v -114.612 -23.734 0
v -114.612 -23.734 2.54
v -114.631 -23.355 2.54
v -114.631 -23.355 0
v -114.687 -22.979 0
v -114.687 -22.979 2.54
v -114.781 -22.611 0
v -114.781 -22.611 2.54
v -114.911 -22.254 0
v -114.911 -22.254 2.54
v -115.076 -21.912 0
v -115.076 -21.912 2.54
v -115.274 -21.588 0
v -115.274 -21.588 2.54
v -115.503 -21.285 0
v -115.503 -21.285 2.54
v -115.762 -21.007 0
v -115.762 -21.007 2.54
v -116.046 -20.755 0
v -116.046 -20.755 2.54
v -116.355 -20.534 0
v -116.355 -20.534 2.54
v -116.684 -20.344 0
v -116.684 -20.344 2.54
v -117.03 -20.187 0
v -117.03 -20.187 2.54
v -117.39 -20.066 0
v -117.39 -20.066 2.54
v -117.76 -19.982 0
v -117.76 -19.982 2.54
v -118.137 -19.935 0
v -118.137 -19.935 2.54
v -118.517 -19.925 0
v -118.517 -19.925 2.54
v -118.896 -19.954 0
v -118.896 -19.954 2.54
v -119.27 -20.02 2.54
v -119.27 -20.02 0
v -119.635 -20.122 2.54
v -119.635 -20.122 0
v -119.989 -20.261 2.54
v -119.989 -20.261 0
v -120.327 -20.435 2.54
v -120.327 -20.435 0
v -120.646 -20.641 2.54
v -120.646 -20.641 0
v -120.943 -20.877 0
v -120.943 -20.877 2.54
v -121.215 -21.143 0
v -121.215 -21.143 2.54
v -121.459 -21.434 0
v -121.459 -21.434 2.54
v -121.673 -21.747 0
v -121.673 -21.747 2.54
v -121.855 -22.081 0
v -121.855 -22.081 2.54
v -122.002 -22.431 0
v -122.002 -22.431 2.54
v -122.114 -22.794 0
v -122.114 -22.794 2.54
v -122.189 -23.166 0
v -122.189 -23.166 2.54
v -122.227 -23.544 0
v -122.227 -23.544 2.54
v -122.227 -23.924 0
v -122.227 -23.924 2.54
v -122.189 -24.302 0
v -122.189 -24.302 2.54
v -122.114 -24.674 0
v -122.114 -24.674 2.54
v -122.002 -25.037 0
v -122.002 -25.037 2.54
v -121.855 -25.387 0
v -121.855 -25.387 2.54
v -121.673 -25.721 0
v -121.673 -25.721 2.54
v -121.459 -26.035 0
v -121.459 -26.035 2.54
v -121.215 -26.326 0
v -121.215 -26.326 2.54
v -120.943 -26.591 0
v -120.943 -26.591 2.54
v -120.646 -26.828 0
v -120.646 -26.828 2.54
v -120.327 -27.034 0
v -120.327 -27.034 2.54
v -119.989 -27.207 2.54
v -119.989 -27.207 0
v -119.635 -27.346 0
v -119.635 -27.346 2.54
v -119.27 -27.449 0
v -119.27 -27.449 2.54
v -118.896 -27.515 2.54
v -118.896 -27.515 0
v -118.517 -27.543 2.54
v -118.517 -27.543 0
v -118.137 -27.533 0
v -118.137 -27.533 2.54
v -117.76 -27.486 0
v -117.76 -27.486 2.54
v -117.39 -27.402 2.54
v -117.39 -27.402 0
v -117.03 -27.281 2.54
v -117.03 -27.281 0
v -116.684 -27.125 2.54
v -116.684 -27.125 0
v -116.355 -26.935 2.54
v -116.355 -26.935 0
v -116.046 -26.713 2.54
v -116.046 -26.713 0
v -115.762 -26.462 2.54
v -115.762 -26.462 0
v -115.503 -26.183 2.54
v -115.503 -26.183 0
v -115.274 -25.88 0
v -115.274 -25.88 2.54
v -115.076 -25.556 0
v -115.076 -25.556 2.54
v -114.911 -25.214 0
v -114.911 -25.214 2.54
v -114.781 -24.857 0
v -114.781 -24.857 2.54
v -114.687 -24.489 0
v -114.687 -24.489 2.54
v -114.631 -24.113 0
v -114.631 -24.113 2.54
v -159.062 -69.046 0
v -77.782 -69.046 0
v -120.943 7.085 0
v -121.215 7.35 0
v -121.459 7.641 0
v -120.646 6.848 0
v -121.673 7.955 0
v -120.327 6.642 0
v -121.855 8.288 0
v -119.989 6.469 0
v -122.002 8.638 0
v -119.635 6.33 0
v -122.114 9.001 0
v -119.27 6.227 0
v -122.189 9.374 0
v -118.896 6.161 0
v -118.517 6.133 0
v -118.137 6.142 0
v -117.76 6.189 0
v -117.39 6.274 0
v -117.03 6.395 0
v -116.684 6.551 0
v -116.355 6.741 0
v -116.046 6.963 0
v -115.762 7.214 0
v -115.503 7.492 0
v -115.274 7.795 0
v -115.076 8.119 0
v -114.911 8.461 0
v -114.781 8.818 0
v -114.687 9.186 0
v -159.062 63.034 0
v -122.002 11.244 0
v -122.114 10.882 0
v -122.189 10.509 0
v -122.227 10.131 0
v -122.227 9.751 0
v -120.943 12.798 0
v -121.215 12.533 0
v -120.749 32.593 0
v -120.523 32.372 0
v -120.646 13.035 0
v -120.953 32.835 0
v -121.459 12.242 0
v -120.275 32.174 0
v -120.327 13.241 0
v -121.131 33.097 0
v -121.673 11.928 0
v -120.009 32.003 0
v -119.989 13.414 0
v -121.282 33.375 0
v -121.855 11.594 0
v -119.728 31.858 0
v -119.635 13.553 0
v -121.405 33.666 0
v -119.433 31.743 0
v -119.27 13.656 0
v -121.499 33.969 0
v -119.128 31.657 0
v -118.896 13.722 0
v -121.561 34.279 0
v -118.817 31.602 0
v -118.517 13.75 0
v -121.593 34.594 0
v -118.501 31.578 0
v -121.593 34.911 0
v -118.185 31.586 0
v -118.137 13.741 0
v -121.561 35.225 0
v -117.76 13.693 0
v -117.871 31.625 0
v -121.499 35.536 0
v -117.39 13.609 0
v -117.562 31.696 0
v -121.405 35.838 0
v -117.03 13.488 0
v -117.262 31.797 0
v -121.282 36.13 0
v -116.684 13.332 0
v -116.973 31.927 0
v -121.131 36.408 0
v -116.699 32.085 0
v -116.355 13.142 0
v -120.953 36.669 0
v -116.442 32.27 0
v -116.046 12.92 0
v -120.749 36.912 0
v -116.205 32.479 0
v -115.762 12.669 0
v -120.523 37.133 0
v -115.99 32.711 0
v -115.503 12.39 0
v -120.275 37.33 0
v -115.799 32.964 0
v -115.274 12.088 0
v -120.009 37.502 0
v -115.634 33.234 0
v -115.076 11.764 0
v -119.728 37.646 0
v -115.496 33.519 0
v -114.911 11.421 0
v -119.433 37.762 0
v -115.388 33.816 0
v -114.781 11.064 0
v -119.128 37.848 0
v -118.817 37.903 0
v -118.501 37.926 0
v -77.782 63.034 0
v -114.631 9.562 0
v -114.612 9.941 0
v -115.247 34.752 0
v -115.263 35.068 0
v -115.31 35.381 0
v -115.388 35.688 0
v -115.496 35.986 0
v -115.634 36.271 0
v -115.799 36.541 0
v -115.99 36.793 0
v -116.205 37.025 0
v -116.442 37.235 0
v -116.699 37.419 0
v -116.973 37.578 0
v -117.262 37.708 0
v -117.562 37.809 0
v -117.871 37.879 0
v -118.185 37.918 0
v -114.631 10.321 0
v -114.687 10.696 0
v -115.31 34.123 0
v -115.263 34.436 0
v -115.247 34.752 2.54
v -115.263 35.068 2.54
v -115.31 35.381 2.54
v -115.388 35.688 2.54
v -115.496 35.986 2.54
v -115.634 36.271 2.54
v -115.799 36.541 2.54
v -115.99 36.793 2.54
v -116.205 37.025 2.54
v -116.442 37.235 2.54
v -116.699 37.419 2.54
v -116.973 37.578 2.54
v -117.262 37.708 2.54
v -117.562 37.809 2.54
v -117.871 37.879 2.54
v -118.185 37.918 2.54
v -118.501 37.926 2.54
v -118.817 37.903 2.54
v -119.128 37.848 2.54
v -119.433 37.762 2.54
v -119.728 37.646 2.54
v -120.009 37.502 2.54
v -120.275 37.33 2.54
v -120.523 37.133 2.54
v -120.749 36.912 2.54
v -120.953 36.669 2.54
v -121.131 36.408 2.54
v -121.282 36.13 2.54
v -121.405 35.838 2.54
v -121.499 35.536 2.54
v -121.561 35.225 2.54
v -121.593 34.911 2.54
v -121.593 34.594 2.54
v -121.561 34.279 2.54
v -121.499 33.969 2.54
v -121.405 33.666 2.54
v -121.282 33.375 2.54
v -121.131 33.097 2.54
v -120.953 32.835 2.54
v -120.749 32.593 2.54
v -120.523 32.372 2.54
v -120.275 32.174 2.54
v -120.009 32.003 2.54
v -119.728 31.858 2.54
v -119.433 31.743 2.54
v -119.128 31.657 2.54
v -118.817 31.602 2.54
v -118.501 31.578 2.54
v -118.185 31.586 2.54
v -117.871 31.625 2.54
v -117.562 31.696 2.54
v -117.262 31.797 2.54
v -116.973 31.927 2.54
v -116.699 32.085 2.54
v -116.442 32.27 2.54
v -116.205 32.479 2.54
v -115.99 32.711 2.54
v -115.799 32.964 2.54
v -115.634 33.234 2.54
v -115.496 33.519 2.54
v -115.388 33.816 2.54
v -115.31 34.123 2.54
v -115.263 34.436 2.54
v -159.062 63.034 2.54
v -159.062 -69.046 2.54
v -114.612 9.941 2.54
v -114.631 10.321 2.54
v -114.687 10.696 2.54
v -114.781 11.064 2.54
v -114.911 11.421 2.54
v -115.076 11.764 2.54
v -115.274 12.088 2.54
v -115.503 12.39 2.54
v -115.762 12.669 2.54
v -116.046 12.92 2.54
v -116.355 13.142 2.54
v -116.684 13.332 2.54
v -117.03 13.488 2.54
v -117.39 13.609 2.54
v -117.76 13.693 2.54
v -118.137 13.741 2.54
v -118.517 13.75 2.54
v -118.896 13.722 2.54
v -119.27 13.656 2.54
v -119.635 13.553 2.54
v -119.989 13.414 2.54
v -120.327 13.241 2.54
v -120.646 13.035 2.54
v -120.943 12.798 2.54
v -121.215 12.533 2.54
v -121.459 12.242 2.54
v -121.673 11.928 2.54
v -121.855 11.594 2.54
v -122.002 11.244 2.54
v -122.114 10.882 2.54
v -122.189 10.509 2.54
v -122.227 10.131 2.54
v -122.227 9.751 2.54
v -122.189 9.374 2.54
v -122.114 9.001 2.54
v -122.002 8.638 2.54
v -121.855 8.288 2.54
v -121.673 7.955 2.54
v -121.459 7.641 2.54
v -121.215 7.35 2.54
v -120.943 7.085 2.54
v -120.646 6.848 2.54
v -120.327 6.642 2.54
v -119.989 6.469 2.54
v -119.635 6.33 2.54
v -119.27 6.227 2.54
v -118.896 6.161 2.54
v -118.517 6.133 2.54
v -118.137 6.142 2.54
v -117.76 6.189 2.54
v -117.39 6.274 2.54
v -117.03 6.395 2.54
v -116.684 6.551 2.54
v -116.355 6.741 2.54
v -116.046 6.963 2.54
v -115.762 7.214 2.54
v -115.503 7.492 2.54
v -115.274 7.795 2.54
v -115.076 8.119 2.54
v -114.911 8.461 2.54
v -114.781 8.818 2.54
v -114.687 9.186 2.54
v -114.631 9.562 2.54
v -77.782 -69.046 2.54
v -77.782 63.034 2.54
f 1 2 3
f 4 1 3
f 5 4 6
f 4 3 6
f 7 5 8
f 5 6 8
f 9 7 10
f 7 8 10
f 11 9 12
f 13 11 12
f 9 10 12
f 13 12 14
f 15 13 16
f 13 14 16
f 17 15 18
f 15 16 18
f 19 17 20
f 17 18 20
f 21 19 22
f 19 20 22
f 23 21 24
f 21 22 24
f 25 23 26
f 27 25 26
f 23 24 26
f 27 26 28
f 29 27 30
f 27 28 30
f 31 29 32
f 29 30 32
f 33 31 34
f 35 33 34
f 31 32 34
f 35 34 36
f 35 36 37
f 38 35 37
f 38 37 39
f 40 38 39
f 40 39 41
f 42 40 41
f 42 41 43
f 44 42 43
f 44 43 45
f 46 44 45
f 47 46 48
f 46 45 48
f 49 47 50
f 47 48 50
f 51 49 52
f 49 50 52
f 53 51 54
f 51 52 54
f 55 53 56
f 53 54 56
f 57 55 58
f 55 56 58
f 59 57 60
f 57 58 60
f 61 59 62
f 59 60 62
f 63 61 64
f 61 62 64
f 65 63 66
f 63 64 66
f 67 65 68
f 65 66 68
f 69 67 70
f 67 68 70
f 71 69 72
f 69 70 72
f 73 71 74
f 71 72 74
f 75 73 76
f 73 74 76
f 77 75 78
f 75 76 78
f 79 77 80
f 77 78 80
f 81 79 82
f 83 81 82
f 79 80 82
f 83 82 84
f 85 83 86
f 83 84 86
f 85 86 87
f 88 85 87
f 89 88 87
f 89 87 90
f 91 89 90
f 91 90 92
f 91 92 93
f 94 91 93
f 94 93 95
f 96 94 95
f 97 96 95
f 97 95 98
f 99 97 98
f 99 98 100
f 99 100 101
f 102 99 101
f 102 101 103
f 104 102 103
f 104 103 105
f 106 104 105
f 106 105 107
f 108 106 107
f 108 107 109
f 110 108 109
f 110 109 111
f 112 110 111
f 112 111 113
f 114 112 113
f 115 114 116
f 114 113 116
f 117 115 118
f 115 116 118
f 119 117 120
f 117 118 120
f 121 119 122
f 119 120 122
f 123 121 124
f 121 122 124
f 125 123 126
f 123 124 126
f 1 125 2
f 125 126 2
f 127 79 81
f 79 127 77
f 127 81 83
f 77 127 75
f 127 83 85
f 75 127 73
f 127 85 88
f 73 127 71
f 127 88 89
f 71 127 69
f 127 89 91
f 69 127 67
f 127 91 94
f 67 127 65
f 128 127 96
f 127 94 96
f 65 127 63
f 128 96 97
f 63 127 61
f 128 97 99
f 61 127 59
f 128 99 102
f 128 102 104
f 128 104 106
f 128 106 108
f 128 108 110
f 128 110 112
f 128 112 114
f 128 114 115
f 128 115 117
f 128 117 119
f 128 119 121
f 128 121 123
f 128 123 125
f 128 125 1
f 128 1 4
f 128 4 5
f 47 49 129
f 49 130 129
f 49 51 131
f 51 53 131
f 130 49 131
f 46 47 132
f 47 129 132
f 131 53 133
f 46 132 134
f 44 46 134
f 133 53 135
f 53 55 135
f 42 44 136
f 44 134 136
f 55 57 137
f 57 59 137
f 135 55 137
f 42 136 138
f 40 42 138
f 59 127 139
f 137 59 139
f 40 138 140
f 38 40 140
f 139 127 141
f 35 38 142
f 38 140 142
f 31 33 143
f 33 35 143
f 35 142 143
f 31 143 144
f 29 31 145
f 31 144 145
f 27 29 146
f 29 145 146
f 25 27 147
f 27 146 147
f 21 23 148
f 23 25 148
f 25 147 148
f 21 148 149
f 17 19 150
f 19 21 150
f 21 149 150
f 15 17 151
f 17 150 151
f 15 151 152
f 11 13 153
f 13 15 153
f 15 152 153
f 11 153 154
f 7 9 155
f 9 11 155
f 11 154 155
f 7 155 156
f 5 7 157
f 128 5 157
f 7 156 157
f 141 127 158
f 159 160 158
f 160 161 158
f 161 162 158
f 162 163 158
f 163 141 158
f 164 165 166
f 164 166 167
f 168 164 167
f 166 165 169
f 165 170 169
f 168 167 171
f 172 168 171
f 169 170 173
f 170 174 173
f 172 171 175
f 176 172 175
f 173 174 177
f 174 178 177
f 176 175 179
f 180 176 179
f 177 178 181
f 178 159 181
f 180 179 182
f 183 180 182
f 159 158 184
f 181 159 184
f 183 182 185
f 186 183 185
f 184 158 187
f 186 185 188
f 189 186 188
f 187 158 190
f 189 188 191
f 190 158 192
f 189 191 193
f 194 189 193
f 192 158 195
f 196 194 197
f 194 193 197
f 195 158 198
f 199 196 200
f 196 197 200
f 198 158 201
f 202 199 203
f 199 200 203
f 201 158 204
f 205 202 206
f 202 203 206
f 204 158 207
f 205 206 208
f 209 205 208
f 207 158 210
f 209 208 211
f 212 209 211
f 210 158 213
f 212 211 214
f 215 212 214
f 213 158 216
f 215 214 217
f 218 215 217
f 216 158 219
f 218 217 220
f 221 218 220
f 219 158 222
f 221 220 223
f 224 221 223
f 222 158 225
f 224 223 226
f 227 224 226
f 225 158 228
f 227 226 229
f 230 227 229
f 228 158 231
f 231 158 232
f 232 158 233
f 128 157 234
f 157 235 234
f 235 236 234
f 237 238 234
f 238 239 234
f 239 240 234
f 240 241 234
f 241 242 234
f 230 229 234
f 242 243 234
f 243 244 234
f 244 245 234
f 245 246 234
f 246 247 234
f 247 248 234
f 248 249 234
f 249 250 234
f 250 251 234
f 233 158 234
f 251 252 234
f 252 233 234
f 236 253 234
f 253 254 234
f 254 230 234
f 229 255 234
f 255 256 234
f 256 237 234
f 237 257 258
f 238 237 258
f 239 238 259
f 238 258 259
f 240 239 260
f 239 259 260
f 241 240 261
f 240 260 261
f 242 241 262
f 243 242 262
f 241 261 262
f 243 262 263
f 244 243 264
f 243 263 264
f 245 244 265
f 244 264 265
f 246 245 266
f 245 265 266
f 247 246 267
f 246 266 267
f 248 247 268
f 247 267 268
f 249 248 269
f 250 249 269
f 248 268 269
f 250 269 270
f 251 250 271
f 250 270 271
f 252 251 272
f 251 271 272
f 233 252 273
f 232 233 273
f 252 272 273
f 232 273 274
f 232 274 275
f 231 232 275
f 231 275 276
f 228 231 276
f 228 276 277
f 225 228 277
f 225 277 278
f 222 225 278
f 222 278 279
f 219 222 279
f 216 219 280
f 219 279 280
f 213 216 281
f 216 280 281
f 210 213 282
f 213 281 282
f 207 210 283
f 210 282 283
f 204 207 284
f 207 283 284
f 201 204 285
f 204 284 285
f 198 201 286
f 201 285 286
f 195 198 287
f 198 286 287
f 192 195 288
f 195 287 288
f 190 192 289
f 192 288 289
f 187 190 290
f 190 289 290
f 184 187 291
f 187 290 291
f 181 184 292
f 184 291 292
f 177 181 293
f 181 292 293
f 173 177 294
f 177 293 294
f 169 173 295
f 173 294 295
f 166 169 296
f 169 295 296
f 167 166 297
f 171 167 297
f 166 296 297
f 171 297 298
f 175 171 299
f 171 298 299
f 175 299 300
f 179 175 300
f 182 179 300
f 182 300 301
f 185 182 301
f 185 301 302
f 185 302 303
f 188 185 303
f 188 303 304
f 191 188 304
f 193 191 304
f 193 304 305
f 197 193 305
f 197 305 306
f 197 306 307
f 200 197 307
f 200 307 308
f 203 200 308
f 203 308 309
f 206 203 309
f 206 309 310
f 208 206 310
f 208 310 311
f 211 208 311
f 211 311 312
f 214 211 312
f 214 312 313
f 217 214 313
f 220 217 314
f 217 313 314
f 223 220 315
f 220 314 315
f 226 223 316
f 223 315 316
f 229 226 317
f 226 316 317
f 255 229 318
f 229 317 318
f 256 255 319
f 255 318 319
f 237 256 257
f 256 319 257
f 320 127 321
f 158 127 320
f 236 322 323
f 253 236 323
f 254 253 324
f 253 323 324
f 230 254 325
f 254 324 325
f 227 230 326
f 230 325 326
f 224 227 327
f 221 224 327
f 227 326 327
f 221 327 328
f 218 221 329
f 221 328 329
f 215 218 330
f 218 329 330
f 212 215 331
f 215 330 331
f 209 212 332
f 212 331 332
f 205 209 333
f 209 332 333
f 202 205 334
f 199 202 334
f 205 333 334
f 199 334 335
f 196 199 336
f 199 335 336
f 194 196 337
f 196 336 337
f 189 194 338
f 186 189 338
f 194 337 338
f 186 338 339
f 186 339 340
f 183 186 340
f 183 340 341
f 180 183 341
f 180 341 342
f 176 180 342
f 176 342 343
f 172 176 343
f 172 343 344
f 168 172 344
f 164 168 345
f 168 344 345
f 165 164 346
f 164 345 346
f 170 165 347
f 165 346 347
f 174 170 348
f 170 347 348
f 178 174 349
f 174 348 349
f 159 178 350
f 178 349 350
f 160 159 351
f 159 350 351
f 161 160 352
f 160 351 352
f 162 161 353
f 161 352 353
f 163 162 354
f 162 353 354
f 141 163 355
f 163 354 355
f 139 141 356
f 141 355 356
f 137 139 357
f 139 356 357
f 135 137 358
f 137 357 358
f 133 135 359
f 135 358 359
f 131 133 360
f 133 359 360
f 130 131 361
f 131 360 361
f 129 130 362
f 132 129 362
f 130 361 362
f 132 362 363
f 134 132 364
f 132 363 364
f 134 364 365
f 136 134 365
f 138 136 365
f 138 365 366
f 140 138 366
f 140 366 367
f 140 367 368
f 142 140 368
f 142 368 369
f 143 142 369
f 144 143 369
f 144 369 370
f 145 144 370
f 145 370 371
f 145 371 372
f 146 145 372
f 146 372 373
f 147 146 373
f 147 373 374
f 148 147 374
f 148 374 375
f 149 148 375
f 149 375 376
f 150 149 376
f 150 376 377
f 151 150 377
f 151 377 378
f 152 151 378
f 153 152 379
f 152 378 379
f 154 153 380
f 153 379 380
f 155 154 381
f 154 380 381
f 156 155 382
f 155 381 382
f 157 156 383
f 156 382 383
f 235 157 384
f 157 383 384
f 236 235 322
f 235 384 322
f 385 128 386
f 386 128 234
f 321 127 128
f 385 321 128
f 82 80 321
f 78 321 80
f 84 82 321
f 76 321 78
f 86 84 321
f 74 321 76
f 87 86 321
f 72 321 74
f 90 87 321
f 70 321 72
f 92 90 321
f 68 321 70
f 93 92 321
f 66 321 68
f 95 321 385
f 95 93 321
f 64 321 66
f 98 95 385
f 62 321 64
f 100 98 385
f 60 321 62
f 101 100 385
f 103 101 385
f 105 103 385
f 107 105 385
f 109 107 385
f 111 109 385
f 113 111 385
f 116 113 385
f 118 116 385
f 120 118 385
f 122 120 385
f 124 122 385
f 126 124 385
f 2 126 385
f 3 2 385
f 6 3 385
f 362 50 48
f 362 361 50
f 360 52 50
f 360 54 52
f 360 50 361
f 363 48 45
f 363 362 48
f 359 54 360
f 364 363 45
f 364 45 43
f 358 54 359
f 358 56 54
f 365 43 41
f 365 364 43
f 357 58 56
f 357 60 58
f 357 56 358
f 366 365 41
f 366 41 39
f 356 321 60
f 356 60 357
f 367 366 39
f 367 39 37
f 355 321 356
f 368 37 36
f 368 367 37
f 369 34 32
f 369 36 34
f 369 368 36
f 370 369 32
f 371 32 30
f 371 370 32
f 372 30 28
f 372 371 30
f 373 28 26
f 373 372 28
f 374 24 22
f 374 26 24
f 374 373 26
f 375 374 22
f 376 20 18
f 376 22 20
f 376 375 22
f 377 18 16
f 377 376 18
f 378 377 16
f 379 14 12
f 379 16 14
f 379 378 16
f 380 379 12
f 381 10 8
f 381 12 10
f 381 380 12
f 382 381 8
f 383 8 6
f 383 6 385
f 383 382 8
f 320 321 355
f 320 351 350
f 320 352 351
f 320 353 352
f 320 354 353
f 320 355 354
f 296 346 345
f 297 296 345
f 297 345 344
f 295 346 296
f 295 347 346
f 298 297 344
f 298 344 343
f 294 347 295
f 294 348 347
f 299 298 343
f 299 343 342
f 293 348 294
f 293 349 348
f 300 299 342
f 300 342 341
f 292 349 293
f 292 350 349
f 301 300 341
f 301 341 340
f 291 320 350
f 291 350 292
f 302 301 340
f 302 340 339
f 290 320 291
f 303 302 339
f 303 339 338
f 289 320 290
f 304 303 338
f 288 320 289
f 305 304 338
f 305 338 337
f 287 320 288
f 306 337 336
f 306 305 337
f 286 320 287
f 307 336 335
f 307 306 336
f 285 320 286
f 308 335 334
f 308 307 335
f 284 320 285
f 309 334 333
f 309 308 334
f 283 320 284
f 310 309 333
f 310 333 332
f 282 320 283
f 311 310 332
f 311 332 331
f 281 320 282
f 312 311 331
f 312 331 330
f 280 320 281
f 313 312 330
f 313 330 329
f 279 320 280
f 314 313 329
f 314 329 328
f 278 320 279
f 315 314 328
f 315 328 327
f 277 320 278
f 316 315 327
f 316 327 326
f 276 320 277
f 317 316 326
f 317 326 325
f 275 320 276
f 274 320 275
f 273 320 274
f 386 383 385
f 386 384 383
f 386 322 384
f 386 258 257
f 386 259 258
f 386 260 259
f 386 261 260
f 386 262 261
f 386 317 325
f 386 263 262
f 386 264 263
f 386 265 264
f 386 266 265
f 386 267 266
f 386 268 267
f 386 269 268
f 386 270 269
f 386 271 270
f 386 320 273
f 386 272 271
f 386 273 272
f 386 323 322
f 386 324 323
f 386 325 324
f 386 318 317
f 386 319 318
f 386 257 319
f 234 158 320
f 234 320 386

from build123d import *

# Parameters (mm, degrees)
F0_W     = 81.28
F0_H     = 132.08
F1_DEPTH = 2.54
F2_R     = 3.175
F5_DEPTH = 2.54
F4_R     = 3.81
F6_DEPTH = 2.54
F3_R     = 3.81
F7_DEPTH = 2.54


with BuildPart() as f1:
    # F0 (on Top) → F1 (new body)
    with BuildSketch(Plane.XY):
        with Locations((-118.42192, -3.005858)):
            Rectangle(F0_W, F0_H)
    extrude(amount=F1_DEPTH)

    # F2 (on face) → F5 (cut)
    with BuildSketch(Plane.XY.offset(2.54)):
        with Locations((-118.42192, 34.752253)):
            Circle(F2_R)
    extrude(amount=-F5_DEPTH, mode=Mode.SUBTRACT)

    # F4 (on face) → F6 (cut)
    with BuildSketch(Plane.XY.offset(2.54)):
        with Locations((-118.42192, -23.734093)):
            Circle(F4_R)
    extrude(amount=-F6_DEPTH, mode=Mode.SUBTRACT)

    # F3 (on face) → F7 (cut)
    with BuildSketch(Plane.XY.offset(2.54)):
        with Locations((-118.42192, 9.941366)):
            Circle(F3_R)
    extrude(amount=-F7_DEPTH, mode=Mode.SUBTRACT)


solid = f1.part
